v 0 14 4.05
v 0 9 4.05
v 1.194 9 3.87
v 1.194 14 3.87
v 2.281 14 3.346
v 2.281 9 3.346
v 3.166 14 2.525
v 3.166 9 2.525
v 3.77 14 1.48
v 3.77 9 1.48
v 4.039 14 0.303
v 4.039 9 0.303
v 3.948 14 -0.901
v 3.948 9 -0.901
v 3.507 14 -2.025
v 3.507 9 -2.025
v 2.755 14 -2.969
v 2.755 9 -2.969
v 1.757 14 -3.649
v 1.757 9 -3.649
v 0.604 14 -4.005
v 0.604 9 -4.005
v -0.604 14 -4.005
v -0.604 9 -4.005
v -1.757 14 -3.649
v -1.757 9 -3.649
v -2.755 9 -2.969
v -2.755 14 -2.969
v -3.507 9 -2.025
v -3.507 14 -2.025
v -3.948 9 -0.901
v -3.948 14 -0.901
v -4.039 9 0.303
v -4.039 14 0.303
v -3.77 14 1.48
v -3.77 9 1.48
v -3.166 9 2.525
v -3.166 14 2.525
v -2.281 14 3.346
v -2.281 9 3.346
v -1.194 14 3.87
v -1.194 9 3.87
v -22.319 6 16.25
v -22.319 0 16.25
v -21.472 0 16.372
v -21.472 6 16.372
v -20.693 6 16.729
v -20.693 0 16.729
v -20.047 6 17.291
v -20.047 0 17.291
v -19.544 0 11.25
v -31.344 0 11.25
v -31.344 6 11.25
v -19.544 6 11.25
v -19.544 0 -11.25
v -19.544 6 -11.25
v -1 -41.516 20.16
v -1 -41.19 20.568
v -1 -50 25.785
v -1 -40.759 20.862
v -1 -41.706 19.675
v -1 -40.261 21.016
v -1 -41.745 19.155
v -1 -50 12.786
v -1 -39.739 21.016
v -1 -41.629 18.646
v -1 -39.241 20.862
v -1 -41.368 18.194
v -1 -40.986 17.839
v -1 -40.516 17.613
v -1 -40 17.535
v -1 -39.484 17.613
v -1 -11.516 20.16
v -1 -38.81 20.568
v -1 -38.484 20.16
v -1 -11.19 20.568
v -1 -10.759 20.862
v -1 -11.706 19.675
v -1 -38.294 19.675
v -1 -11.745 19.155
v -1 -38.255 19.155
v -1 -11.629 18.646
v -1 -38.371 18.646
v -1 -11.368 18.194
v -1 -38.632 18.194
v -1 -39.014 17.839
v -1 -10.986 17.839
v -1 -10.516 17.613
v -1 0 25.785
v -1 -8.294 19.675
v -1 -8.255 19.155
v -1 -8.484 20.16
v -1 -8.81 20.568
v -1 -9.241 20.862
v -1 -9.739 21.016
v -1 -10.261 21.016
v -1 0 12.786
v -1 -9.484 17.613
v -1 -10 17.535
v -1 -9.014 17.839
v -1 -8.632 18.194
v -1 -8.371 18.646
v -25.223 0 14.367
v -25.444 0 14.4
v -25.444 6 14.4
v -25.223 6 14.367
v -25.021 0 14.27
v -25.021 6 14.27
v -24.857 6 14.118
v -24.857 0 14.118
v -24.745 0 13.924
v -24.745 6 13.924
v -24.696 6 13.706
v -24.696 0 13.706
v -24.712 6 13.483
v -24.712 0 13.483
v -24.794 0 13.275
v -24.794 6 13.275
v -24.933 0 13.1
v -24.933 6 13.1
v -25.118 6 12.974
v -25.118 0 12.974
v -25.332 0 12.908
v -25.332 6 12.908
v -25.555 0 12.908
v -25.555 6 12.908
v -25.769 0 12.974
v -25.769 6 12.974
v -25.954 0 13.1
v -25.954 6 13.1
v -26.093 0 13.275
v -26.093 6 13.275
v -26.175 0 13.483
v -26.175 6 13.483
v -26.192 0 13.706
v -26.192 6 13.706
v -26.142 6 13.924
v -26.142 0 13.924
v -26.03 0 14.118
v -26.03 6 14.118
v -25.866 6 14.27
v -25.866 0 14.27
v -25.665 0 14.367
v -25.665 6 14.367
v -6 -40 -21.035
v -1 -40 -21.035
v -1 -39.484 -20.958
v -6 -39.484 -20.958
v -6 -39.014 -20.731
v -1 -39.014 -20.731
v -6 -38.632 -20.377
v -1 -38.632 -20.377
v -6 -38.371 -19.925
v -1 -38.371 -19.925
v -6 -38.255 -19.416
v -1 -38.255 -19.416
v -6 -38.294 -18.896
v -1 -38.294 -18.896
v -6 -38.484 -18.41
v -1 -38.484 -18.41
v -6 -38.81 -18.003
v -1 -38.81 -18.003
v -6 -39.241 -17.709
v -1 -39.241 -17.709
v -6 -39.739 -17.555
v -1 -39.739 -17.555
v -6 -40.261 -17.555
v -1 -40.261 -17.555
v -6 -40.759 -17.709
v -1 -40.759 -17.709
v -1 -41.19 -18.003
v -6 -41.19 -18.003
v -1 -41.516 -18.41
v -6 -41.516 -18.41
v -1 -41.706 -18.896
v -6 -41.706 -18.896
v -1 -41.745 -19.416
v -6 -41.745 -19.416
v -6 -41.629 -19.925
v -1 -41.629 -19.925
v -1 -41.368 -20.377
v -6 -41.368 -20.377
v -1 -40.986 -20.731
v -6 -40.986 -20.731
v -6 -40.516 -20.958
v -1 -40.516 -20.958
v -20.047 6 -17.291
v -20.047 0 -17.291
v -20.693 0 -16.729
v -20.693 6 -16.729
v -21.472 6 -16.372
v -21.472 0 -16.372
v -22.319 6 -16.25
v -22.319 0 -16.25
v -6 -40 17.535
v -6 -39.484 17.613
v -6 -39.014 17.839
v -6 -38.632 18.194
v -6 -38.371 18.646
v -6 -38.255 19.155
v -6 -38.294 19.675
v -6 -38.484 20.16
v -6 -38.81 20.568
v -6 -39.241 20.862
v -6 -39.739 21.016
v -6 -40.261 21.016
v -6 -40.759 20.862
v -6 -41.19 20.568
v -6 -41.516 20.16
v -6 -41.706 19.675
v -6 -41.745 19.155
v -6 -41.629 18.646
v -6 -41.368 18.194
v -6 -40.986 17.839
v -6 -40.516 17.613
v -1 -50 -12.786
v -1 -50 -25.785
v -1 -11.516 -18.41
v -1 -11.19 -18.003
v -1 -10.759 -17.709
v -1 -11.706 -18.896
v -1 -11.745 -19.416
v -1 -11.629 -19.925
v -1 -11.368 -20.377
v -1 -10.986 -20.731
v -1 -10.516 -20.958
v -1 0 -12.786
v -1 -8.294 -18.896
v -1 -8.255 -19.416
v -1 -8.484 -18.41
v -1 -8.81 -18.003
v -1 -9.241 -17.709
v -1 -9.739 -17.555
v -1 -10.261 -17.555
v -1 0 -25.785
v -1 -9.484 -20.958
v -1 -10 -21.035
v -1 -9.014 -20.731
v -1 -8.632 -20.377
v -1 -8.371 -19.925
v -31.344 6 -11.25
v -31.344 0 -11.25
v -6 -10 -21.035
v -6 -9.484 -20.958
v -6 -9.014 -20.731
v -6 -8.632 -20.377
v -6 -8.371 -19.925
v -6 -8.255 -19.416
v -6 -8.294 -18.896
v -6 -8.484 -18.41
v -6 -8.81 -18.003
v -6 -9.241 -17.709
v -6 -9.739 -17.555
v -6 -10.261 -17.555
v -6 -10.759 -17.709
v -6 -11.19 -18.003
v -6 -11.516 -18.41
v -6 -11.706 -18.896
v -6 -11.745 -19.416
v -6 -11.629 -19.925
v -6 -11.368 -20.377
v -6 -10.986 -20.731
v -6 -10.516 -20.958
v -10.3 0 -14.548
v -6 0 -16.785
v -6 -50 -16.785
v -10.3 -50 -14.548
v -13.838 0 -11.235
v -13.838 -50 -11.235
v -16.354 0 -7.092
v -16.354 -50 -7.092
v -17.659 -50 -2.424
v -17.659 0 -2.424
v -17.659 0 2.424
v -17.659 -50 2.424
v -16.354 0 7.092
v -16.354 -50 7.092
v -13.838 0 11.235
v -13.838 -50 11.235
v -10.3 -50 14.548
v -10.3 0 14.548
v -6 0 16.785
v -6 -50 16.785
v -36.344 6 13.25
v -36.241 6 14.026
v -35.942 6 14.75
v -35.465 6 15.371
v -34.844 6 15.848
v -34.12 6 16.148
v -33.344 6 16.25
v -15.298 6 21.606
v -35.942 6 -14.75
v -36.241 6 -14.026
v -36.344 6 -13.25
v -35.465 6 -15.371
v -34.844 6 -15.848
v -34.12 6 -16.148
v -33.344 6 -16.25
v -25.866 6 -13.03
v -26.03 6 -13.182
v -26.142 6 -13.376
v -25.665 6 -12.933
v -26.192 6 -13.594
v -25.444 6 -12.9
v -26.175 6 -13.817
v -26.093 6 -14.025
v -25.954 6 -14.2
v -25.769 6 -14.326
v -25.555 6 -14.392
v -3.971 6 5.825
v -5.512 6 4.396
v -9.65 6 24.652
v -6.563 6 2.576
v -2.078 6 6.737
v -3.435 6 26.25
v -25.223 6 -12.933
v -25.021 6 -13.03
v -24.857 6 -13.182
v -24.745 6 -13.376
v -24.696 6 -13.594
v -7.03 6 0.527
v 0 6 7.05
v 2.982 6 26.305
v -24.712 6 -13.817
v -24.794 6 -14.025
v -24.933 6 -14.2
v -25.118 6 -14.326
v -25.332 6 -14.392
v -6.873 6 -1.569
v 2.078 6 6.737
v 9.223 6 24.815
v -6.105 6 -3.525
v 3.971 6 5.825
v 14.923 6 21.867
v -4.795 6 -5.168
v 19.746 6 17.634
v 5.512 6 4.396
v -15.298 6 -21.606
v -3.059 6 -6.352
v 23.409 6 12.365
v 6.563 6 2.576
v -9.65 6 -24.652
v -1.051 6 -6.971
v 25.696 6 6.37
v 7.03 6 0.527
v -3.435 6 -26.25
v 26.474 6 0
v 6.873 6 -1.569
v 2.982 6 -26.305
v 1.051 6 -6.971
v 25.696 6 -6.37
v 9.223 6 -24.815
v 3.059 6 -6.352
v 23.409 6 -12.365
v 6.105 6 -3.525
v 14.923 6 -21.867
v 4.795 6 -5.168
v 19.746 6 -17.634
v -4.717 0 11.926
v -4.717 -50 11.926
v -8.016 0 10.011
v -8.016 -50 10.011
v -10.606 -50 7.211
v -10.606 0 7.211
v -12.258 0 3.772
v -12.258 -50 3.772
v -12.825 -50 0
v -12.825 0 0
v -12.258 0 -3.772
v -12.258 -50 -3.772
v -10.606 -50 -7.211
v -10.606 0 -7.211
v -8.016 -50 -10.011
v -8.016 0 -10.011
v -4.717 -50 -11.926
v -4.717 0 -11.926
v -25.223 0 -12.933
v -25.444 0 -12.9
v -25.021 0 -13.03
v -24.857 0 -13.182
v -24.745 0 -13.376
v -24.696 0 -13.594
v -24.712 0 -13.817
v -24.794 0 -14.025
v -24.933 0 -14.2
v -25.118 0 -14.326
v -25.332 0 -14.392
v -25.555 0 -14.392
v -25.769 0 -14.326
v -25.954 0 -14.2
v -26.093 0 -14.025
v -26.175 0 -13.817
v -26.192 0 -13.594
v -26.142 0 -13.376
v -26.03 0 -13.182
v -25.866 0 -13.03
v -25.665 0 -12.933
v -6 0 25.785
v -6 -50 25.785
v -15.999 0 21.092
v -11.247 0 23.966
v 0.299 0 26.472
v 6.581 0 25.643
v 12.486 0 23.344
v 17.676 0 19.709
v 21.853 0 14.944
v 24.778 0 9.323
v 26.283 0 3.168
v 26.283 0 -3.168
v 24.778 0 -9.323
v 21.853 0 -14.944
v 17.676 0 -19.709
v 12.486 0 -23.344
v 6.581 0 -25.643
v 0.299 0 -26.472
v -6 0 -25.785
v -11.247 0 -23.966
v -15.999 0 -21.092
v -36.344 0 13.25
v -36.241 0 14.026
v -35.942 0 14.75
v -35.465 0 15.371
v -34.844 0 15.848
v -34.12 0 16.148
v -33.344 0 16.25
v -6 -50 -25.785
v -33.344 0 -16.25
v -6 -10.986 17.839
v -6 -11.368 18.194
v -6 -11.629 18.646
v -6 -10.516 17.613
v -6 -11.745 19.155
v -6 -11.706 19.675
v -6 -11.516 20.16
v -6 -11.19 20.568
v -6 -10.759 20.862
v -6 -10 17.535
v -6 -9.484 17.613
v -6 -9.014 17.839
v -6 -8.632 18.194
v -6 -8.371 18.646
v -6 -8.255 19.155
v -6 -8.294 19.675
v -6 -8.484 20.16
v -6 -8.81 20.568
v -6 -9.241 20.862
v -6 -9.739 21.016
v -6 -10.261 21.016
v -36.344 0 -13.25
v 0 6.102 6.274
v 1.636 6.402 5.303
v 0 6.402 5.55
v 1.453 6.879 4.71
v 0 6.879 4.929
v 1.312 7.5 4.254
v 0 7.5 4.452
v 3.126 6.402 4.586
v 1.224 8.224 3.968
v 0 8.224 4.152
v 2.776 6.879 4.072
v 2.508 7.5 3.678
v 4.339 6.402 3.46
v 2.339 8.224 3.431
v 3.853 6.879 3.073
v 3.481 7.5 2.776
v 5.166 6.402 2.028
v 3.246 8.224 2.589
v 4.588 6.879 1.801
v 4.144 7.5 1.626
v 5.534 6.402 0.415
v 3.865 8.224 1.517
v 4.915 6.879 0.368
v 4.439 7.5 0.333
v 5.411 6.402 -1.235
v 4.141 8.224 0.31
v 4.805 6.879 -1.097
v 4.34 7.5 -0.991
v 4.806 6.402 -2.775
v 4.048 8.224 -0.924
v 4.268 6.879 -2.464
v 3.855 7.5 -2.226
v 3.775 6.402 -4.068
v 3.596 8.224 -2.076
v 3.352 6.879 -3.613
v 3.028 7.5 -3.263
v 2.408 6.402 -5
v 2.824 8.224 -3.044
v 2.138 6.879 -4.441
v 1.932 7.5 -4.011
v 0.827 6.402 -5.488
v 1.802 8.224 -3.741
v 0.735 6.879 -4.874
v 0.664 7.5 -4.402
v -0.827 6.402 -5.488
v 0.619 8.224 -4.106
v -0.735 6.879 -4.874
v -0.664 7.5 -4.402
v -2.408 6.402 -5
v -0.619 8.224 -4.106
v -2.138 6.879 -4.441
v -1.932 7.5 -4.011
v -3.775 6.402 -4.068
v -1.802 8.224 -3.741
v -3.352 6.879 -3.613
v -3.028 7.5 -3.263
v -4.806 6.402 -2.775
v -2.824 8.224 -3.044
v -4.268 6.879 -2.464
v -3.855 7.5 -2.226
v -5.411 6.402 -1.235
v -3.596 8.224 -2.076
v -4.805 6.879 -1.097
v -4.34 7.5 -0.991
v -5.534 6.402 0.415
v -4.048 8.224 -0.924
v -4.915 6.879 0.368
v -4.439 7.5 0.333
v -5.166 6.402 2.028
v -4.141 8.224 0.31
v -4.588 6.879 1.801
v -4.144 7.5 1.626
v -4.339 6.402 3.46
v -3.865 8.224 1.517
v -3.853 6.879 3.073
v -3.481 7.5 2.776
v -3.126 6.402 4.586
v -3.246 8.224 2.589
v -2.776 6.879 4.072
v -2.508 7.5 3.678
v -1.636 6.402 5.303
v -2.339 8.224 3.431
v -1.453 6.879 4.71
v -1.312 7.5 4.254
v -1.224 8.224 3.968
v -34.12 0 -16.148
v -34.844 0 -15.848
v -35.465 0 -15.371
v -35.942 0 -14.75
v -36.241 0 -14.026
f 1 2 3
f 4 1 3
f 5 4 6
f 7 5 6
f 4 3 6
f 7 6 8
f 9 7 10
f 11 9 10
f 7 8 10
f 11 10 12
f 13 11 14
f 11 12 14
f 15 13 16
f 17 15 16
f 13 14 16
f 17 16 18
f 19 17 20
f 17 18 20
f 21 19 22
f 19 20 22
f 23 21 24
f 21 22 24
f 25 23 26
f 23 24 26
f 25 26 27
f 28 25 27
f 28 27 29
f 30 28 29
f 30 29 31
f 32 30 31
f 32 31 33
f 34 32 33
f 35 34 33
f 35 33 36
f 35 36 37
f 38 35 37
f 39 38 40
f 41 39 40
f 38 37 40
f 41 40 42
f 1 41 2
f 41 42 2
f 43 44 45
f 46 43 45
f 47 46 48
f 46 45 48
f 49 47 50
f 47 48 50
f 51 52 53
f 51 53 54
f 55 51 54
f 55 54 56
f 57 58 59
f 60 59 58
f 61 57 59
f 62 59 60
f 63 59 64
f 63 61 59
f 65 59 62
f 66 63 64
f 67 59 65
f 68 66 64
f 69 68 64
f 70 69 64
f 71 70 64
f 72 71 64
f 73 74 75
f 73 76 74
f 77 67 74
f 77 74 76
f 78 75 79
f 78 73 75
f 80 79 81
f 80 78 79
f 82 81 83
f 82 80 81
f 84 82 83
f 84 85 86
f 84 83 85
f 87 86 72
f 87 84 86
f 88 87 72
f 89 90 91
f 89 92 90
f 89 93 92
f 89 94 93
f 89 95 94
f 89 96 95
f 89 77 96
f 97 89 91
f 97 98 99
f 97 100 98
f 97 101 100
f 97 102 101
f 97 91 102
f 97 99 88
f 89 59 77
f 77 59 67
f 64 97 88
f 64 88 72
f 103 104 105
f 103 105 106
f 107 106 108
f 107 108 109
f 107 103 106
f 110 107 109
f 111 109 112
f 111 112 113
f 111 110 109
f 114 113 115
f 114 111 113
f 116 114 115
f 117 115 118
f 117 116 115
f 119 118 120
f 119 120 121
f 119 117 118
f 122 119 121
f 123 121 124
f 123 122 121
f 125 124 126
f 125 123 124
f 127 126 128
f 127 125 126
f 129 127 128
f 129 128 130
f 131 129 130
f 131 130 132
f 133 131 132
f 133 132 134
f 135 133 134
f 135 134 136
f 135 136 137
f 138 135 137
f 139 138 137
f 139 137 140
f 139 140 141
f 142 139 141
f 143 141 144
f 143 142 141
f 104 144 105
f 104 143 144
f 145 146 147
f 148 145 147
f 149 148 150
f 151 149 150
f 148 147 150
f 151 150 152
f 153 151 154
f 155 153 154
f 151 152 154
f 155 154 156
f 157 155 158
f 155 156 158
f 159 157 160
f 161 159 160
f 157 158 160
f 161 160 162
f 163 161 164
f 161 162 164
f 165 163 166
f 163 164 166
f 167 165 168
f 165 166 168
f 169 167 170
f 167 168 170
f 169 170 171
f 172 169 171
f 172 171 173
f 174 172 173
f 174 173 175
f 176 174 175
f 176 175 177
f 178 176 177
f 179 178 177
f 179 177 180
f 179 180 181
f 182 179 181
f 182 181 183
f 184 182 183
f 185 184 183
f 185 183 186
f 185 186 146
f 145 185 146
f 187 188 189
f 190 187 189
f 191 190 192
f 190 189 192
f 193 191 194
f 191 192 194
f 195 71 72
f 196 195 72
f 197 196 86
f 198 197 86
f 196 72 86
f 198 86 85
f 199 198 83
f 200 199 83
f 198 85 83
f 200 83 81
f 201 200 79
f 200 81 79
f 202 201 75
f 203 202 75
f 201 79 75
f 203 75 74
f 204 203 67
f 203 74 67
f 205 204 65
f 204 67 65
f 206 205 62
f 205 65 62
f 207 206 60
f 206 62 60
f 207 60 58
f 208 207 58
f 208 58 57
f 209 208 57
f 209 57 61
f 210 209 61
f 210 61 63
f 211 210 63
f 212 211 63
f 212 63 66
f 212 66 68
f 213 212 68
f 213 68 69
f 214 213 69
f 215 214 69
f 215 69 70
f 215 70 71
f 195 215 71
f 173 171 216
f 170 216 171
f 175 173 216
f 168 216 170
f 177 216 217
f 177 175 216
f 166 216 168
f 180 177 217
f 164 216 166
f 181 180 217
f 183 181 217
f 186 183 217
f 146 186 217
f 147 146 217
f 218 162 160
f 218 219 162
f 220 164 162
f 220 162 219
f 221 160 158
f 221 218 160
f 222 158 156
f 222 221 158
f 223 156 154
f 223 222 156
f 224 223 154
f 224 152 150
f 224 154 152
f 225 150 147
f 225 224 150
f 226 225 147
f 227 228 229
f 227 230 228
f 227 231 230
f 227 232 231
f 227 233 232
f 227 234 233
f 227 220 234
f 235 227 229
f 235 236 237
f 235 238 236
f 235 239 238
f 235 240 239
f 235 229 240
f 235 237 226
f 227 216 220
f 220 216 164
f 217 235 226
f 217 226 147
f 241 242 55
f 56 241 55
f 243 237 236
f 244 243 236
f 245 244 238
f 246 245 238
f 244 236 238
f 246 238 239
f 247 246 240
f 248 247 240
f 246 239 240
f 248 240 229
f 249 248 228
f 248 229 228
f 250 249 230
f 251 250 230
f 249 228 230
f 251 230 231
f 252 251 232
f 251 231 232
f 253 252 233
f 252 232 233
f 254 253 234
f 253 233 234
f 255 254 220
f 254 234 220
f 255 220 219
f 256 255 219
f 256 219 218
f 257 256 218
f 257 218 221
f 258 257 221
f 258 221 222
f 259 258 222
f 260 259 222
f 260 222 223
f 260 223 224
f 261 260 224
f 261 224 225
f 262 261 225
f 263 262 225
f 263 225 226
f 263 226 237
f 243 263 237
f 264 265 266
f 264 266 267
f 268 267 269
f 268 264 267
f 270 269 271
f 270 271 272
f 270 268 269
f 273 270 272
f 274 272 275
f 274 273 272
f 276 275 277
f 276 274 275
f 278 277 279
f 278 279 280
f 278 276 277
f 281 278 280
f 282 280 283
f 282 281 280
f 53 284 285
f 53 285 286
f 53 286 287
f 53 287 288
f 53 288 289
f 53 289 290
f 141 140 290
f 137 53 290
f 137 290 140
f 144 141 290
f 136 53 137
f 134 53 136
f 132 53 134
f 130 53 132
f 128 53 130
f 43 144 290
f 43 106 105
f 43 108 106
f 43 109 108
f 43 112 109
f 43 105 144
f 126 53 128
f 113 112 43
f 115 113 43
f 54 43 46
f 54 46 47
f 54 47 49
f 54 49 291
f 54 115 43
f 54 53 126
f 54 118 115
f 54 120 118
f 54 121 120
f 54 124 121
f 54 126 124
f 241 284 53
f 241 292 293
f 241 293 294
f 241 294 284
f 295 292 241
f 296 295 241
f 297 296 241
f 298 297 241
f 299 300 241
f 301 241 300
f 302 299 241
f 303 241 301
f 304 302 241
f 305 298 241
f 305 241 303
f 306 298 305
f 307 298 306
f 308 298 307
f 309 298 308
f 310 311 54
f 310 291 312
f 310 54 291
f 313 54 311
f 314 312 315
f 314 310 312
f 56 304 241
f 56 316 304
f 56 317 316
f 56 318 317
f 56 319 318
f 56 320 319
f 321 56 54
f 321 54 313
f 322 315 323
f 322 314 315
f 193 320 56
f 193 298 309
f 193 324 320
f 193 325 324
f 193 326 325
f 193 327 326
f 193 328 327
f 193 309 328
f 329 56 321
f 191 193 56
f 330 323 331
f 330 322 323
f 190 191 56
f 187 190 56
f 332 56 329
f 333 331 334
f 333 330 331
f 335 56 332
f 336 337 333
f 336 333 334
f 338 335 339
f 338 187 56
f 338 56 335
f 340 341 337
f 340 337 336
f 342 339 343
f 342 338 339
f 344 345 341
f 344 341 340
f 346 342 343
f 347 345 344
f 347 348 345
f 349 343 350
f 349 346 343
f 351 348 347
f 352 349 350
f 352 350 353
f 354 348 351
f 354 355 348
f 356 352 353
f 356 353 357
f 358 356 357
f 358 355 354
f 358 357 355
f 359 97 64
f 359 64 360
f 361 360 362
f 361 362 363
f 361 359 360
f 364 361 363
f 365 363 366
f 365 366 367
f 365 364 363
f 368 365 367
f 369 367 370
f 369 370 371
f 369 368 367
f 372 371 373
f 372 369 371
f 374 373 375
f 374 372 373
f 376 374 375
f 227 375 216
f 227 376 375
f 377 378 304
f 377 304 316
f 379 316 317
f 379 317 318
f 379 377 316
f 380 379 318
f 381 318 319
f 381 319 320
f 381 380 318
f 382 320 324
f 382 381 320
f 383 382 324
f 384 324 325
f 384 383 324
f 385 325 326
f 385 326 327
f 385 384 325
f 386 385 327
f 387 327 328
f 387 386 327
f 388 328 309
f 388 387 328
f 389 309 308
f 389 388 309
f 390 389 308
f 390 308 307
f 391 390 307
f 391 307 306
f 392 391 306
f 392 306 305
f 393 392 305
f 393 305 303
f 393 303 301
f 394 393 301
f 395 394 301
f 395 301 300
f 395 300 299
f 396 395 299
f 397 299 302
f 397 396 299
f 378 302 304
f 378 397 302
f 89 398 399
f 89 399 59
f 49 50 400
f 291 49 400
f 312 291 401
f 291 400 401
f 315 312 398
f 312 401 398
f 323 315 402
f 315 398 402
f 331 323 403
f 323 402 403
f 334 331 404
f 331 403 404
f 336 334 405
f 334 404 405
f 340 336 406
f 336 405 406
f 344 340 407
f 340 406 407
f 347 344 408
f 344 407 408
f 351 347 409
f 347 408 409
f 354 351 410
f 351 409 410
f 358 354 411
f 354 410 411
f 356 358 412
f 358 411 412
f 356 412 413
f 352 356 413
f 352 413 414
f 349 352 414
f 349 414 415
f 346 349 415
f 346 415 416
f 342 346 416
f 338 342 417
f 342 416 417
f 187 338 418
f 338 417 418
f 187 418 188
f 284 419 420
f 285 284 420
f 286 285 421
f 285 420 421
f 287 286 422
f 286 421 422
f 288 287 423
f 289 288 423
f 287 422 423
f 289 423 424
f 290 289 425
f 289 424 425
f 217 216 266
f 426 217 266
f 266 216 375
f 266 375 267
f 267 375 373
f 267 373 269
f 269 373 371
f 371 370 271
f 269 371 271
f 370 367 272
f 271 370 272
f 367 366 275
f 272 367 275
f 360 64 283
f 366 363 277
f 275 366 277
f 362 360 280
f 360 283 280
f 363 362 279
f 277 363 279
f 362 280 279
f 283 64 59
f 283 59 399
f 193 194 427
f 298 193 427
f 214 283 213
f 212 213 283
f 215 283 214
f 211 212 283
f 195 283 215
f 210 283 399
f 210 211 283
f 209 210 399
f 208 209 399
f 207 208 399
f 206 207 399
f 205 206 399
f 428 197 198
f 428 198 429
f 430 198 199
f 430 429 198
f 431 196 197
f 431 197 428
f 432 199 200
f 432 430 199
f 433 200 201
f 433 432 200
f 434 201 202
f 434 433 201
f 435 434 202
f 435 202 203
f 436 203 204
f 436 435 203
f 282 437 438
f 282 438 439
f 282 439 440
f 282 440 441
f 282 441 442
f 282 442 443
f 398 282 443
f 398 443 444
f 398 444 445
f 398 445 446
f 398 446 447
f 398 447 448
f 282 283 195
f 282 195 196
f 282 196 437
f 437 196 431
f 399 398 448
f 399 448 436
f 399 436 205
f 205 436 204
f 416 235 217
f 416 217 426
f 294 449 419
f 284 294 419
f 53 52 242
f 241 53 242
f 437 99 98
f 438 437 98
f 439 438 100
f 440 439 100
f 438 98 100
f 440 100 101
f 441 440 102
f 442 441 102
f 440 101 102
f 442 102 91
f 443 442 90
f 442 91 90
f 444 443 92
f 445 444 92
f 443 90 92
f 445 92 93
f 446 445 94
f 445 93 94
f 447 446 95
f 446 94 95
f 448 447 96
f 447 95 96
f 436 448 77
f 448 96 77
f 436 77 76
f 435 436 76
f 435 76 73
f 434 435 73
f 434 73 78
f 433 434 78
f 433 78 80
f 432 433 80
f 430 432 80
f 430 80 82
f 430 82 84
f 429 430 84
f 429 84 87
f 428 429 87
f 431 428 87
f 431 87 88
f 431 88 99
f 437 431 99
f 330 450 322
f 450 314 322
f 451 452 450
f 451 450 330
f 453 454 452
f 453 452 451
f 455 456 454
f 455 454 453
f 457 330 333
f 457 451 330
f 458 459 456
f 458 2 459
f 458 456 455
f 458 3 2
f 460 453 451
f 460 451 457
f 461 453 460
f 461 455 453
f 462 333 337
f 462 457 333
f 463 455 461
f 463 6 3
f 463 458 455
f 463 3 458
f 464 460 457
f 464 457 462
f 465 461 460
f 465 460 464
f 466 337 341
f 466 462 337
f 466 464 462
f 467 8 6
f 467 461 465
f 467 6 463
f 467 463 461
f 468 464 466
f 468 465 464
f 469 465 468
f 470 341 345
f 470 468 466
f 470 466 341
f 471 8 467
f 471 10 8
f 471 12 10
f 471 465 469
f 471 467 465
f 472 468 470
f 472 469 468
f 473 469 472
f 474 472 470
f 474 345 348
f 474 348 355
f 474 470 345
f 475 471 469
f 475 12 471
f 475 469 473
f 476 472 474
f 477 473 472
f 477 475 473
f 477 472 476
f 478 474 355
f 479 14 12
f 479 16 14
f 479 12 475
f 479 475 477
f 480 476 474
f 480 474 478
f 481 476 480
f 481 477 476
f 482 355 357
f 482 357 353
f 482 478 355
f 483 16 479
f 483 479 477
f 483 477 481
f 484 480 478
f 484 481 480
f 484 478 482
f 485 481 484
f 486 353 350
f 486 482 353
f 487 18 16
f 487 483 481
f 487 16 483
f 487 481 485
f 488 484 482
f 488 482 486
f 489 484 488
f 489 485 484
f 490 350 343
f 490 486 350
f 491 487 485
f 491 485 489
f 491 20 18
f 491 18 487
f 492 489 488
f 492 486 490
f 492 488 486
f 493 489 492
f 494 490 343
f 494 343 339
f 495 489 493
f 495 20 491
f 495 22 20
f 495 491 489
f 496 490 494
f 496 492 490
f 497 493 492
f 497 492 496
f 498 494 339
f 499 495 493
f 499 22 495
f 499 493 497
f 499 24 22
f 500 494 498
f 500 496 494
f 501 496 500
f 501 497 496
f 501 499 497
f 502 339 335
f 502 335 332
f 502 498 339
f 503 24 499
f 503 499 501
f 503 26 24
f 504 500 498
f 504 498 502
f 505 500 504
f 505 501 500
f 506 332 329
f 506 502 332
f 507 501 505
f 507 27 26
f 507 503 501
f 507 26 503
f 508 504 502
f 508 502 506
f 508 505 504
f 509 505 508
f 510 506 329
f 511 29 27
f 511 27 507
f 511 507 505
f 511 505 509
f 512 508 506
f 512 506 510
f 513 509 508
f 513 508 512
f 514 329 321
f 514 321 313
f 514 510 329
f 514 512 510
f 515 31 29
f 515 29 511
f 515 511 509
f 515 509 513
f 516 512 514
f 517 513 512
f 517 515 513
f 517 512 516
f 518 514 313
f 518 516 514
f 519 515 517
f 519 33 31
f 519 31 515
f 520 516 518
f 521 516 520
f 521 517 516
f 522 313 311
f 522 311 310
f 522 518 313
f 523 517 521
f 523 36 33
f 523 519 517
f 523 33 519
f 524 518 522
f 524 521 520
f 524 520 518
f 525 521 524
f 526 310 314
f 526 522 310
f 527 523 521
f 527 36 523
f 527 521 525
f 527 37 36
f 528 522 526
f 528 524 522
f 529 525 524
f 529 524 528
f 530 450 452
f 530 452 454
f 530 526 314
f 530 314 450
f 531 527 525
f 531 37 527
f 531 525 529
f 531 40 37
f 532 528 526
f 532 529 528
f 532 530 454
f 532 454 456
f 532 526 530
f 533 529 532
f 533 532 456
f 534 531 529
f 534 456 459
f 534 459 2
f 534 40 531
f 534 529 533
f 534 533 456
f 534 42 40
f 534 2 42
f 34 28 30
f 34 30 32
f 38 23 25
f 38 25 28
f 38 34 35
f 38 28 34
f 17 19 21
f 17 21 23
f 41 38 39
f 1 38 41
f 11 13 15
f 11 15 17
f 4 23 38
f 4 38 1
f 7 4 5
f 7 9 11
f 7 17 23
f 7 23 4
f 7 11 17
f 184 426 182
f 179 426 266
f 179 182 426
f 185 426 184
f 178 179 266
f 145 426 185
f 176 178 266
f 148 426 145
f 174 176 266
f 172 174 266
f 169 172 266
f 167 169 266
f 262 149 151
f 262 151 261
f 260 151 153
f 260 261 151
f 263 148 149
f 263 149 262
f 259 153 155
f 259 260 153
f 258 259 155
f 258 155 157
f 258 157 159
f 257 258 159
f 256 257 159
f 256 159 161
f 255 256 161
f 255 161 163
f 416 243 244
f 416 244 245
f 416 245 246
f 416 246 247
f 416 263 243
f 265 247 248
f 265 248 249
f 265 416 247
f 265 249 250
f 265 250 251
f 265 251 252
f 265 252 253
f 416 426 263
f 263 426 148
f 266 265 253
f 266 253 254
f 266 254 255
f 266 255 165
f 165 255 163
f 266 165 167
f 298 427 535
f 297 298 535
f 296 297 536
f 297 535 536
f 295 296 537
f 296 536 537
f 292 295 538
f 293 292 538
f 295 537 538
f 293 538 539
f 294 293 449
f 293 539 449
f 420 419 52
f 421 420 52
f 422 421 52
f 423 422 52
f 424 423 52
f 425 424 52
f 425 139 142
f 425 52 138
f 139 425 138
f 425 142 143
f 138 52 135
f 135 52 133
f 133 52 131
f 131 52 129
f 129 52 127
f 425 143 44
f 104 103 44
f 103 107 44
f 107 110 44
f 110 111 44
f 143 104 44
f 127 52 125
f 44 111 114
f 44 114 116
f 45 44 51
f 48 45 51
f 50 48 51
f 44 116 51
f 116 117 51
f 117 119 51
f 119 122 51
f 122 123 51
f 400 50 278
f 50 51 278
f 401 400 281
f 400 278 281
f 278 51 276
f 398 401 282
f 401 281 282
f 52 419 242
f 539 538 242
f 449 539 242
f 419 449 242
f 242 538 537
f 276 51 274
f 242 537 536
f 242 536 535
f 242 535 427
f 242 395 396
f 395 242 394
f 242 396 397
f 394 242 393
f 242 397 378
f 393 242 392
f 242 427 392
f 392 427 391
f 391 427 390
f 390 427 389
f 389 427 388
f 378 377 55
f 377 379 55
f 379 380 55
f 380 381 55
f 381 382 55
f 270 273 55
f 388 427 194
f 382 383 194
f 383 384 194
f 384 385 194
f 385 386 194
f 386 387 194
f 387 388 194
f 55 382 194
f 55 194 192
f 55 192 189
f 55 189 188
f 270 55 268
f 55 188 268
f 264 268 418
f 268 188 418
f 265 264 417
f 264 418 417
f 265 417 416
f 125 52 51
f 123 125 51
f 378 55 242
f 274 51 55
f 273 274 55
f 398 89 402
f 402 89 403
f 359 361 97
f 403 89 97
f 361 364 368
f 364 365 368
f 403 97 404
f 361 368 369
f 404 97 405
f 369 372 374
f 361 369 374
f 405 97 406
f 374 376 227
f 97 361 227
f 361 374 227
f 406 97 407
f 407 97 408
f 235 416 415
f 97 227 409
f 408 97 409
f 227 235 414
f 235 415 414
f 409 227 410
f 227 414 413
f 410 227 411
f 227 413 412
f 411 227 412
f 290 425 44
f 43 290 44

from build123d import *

# Parameters (mm, degrees)
BOSS_EXTRUDE4_DEPTH = 50
SKETCH7_R           = 1.75
CUT_EXTRUDE1_DEPTH  = 59.719147195
SKETCH8_R           = 0.75
SKETCH8_W           = 11.8
SKETCH8_H           = 22.5
BOSS_EXTRUDE5_DEPTH = 6
SKETCH9_R           = 4.05
BOSS_EXTRUDE6_DEPTH = 8
FILLET1_R           = 3


with BuildPart() as part:
    # Sketch6 → Boss-Extrude4 (new body)
    with BuildSketch(Plane.XZ):
        with BuildLine():
            Line((-1, 25.784833184), (-1, 12.785954208))
            ThreePointArc((-1, 12.785954208), (-12.825, 0), (-1, -12.785954208))
            Line((-1, -12.785954208), (-1, -25.784833184))
            Line((-1, -25.784833184), (-6, -25.784833184))
            Line((-6, -25.784833184), (-6, -16.784833184))
            ThreePointArc((-6, -16.784833184), (-17.825, 0), (-6, 16.784833184))
            Line((-6, 16.784833184), (-6, 25.784833184))
            Line((-6, 25.784833184), (-1, 25.784833184))
        make_face()
    extrude(amount=BOSS_EXTRUDE4_DEPTH)

    # Sketch7 → Cut-Extrude1 (cut, through all)
    with BuildSketch(Plane(origin=(-1, 0, 0), x_dir=(0, 0, -1), z_dir=(1, 0, 0))):
        with Locations((-19.285393696, -10)):
            Circle(SKETCH7_R)
        with Locations((-19.285393696, -40)):
            Circle(SKETCH7_R)
        with Locations((19.285393696, -40)):
            Circle(SKETCH7_R)
        with Locations((19.285393696, -10)):
            Circle(SKETCH7_R)
    extrude(amount=-CUT_EXTRUDE1_DEPTH, mode=Mode.SUBTRACT)

    # Sketch8 → Boss-Extrude5 (add)
    with BuildSketch(Plane(origin=(0, 0, 0), x_dir=(1, 0, 0), z_dir=(0, 1, 0))):
        with BuildLine():
            Line((-33.34361413, -16.25), (-22.318992281, -16.25))
            ThreePointArc((-22.318992281, -16.25), (-21.069616181, -16.522536094), (-20.047240136, -17.290627093))
            ThreePointArc((-20.047240136, -17.290627093), (26.473715688, 0), (-20.047240136, 17.290627093))
            ThreePointArc((-20.047240136, 17.290627093), (-21.069616181, 16.522536094), (-22.318992281, 16.25))
            Line((-22.318992281, 16.25), (-33.34361413, 16.25))
            ThreePointArc((-33.34361413, 16.25), (-35.464934474, 15.371320344), (-36.34361413, 13.25))
            Line((-36.34361413, 13.25), (-36.34361413, -13.25))
            ThreePointArc((-36.34361413, -13.25), (-35.464934474, -15.371320344), (-33.34361413, -16.25))
        make_face()
        with Locations(Location((-25.44361413, 13.65, 0), (0, 0, 270))):
            Circle(SKETCH8_R, mode=Mode.SUBTRACT)
        with Locations(Location((-25.44361413, -13.65, 0), (0, 0, 270))):
            Circle(SKETCH8_R, mode=Mode.SUBTRACT)
        with Locations((-25.44361413, 0)):
            Rectangle(SKETCH8_W, SKETCH8_H, mode=Mode.SUBTRACT)
    extrude(amount=BOSS_EXTRUDE5_DEPTH)

    # Sketch9 → Boss-Extrude6 (add)
    with BuildSketch(Plane(origin=(0, 6, 0), x_dir=(1, 0, 0), z_dir=(0, 1, 0))):
        with Locations(Location((0, 0, 0), (0, 0, 270))):
            Circle(SKETCH9_R)
    extrude(amount=BOSS_EXTRUDE6_DEPTH)

    # Fillet1
    fillet1_edges = [part.edges().sort_by_distance(p)[0] for p in [
        (0, 6, -4.05),
    ]]
    fillet(fillet1_edges, radius=FILLET1_R)


solid = part.part
